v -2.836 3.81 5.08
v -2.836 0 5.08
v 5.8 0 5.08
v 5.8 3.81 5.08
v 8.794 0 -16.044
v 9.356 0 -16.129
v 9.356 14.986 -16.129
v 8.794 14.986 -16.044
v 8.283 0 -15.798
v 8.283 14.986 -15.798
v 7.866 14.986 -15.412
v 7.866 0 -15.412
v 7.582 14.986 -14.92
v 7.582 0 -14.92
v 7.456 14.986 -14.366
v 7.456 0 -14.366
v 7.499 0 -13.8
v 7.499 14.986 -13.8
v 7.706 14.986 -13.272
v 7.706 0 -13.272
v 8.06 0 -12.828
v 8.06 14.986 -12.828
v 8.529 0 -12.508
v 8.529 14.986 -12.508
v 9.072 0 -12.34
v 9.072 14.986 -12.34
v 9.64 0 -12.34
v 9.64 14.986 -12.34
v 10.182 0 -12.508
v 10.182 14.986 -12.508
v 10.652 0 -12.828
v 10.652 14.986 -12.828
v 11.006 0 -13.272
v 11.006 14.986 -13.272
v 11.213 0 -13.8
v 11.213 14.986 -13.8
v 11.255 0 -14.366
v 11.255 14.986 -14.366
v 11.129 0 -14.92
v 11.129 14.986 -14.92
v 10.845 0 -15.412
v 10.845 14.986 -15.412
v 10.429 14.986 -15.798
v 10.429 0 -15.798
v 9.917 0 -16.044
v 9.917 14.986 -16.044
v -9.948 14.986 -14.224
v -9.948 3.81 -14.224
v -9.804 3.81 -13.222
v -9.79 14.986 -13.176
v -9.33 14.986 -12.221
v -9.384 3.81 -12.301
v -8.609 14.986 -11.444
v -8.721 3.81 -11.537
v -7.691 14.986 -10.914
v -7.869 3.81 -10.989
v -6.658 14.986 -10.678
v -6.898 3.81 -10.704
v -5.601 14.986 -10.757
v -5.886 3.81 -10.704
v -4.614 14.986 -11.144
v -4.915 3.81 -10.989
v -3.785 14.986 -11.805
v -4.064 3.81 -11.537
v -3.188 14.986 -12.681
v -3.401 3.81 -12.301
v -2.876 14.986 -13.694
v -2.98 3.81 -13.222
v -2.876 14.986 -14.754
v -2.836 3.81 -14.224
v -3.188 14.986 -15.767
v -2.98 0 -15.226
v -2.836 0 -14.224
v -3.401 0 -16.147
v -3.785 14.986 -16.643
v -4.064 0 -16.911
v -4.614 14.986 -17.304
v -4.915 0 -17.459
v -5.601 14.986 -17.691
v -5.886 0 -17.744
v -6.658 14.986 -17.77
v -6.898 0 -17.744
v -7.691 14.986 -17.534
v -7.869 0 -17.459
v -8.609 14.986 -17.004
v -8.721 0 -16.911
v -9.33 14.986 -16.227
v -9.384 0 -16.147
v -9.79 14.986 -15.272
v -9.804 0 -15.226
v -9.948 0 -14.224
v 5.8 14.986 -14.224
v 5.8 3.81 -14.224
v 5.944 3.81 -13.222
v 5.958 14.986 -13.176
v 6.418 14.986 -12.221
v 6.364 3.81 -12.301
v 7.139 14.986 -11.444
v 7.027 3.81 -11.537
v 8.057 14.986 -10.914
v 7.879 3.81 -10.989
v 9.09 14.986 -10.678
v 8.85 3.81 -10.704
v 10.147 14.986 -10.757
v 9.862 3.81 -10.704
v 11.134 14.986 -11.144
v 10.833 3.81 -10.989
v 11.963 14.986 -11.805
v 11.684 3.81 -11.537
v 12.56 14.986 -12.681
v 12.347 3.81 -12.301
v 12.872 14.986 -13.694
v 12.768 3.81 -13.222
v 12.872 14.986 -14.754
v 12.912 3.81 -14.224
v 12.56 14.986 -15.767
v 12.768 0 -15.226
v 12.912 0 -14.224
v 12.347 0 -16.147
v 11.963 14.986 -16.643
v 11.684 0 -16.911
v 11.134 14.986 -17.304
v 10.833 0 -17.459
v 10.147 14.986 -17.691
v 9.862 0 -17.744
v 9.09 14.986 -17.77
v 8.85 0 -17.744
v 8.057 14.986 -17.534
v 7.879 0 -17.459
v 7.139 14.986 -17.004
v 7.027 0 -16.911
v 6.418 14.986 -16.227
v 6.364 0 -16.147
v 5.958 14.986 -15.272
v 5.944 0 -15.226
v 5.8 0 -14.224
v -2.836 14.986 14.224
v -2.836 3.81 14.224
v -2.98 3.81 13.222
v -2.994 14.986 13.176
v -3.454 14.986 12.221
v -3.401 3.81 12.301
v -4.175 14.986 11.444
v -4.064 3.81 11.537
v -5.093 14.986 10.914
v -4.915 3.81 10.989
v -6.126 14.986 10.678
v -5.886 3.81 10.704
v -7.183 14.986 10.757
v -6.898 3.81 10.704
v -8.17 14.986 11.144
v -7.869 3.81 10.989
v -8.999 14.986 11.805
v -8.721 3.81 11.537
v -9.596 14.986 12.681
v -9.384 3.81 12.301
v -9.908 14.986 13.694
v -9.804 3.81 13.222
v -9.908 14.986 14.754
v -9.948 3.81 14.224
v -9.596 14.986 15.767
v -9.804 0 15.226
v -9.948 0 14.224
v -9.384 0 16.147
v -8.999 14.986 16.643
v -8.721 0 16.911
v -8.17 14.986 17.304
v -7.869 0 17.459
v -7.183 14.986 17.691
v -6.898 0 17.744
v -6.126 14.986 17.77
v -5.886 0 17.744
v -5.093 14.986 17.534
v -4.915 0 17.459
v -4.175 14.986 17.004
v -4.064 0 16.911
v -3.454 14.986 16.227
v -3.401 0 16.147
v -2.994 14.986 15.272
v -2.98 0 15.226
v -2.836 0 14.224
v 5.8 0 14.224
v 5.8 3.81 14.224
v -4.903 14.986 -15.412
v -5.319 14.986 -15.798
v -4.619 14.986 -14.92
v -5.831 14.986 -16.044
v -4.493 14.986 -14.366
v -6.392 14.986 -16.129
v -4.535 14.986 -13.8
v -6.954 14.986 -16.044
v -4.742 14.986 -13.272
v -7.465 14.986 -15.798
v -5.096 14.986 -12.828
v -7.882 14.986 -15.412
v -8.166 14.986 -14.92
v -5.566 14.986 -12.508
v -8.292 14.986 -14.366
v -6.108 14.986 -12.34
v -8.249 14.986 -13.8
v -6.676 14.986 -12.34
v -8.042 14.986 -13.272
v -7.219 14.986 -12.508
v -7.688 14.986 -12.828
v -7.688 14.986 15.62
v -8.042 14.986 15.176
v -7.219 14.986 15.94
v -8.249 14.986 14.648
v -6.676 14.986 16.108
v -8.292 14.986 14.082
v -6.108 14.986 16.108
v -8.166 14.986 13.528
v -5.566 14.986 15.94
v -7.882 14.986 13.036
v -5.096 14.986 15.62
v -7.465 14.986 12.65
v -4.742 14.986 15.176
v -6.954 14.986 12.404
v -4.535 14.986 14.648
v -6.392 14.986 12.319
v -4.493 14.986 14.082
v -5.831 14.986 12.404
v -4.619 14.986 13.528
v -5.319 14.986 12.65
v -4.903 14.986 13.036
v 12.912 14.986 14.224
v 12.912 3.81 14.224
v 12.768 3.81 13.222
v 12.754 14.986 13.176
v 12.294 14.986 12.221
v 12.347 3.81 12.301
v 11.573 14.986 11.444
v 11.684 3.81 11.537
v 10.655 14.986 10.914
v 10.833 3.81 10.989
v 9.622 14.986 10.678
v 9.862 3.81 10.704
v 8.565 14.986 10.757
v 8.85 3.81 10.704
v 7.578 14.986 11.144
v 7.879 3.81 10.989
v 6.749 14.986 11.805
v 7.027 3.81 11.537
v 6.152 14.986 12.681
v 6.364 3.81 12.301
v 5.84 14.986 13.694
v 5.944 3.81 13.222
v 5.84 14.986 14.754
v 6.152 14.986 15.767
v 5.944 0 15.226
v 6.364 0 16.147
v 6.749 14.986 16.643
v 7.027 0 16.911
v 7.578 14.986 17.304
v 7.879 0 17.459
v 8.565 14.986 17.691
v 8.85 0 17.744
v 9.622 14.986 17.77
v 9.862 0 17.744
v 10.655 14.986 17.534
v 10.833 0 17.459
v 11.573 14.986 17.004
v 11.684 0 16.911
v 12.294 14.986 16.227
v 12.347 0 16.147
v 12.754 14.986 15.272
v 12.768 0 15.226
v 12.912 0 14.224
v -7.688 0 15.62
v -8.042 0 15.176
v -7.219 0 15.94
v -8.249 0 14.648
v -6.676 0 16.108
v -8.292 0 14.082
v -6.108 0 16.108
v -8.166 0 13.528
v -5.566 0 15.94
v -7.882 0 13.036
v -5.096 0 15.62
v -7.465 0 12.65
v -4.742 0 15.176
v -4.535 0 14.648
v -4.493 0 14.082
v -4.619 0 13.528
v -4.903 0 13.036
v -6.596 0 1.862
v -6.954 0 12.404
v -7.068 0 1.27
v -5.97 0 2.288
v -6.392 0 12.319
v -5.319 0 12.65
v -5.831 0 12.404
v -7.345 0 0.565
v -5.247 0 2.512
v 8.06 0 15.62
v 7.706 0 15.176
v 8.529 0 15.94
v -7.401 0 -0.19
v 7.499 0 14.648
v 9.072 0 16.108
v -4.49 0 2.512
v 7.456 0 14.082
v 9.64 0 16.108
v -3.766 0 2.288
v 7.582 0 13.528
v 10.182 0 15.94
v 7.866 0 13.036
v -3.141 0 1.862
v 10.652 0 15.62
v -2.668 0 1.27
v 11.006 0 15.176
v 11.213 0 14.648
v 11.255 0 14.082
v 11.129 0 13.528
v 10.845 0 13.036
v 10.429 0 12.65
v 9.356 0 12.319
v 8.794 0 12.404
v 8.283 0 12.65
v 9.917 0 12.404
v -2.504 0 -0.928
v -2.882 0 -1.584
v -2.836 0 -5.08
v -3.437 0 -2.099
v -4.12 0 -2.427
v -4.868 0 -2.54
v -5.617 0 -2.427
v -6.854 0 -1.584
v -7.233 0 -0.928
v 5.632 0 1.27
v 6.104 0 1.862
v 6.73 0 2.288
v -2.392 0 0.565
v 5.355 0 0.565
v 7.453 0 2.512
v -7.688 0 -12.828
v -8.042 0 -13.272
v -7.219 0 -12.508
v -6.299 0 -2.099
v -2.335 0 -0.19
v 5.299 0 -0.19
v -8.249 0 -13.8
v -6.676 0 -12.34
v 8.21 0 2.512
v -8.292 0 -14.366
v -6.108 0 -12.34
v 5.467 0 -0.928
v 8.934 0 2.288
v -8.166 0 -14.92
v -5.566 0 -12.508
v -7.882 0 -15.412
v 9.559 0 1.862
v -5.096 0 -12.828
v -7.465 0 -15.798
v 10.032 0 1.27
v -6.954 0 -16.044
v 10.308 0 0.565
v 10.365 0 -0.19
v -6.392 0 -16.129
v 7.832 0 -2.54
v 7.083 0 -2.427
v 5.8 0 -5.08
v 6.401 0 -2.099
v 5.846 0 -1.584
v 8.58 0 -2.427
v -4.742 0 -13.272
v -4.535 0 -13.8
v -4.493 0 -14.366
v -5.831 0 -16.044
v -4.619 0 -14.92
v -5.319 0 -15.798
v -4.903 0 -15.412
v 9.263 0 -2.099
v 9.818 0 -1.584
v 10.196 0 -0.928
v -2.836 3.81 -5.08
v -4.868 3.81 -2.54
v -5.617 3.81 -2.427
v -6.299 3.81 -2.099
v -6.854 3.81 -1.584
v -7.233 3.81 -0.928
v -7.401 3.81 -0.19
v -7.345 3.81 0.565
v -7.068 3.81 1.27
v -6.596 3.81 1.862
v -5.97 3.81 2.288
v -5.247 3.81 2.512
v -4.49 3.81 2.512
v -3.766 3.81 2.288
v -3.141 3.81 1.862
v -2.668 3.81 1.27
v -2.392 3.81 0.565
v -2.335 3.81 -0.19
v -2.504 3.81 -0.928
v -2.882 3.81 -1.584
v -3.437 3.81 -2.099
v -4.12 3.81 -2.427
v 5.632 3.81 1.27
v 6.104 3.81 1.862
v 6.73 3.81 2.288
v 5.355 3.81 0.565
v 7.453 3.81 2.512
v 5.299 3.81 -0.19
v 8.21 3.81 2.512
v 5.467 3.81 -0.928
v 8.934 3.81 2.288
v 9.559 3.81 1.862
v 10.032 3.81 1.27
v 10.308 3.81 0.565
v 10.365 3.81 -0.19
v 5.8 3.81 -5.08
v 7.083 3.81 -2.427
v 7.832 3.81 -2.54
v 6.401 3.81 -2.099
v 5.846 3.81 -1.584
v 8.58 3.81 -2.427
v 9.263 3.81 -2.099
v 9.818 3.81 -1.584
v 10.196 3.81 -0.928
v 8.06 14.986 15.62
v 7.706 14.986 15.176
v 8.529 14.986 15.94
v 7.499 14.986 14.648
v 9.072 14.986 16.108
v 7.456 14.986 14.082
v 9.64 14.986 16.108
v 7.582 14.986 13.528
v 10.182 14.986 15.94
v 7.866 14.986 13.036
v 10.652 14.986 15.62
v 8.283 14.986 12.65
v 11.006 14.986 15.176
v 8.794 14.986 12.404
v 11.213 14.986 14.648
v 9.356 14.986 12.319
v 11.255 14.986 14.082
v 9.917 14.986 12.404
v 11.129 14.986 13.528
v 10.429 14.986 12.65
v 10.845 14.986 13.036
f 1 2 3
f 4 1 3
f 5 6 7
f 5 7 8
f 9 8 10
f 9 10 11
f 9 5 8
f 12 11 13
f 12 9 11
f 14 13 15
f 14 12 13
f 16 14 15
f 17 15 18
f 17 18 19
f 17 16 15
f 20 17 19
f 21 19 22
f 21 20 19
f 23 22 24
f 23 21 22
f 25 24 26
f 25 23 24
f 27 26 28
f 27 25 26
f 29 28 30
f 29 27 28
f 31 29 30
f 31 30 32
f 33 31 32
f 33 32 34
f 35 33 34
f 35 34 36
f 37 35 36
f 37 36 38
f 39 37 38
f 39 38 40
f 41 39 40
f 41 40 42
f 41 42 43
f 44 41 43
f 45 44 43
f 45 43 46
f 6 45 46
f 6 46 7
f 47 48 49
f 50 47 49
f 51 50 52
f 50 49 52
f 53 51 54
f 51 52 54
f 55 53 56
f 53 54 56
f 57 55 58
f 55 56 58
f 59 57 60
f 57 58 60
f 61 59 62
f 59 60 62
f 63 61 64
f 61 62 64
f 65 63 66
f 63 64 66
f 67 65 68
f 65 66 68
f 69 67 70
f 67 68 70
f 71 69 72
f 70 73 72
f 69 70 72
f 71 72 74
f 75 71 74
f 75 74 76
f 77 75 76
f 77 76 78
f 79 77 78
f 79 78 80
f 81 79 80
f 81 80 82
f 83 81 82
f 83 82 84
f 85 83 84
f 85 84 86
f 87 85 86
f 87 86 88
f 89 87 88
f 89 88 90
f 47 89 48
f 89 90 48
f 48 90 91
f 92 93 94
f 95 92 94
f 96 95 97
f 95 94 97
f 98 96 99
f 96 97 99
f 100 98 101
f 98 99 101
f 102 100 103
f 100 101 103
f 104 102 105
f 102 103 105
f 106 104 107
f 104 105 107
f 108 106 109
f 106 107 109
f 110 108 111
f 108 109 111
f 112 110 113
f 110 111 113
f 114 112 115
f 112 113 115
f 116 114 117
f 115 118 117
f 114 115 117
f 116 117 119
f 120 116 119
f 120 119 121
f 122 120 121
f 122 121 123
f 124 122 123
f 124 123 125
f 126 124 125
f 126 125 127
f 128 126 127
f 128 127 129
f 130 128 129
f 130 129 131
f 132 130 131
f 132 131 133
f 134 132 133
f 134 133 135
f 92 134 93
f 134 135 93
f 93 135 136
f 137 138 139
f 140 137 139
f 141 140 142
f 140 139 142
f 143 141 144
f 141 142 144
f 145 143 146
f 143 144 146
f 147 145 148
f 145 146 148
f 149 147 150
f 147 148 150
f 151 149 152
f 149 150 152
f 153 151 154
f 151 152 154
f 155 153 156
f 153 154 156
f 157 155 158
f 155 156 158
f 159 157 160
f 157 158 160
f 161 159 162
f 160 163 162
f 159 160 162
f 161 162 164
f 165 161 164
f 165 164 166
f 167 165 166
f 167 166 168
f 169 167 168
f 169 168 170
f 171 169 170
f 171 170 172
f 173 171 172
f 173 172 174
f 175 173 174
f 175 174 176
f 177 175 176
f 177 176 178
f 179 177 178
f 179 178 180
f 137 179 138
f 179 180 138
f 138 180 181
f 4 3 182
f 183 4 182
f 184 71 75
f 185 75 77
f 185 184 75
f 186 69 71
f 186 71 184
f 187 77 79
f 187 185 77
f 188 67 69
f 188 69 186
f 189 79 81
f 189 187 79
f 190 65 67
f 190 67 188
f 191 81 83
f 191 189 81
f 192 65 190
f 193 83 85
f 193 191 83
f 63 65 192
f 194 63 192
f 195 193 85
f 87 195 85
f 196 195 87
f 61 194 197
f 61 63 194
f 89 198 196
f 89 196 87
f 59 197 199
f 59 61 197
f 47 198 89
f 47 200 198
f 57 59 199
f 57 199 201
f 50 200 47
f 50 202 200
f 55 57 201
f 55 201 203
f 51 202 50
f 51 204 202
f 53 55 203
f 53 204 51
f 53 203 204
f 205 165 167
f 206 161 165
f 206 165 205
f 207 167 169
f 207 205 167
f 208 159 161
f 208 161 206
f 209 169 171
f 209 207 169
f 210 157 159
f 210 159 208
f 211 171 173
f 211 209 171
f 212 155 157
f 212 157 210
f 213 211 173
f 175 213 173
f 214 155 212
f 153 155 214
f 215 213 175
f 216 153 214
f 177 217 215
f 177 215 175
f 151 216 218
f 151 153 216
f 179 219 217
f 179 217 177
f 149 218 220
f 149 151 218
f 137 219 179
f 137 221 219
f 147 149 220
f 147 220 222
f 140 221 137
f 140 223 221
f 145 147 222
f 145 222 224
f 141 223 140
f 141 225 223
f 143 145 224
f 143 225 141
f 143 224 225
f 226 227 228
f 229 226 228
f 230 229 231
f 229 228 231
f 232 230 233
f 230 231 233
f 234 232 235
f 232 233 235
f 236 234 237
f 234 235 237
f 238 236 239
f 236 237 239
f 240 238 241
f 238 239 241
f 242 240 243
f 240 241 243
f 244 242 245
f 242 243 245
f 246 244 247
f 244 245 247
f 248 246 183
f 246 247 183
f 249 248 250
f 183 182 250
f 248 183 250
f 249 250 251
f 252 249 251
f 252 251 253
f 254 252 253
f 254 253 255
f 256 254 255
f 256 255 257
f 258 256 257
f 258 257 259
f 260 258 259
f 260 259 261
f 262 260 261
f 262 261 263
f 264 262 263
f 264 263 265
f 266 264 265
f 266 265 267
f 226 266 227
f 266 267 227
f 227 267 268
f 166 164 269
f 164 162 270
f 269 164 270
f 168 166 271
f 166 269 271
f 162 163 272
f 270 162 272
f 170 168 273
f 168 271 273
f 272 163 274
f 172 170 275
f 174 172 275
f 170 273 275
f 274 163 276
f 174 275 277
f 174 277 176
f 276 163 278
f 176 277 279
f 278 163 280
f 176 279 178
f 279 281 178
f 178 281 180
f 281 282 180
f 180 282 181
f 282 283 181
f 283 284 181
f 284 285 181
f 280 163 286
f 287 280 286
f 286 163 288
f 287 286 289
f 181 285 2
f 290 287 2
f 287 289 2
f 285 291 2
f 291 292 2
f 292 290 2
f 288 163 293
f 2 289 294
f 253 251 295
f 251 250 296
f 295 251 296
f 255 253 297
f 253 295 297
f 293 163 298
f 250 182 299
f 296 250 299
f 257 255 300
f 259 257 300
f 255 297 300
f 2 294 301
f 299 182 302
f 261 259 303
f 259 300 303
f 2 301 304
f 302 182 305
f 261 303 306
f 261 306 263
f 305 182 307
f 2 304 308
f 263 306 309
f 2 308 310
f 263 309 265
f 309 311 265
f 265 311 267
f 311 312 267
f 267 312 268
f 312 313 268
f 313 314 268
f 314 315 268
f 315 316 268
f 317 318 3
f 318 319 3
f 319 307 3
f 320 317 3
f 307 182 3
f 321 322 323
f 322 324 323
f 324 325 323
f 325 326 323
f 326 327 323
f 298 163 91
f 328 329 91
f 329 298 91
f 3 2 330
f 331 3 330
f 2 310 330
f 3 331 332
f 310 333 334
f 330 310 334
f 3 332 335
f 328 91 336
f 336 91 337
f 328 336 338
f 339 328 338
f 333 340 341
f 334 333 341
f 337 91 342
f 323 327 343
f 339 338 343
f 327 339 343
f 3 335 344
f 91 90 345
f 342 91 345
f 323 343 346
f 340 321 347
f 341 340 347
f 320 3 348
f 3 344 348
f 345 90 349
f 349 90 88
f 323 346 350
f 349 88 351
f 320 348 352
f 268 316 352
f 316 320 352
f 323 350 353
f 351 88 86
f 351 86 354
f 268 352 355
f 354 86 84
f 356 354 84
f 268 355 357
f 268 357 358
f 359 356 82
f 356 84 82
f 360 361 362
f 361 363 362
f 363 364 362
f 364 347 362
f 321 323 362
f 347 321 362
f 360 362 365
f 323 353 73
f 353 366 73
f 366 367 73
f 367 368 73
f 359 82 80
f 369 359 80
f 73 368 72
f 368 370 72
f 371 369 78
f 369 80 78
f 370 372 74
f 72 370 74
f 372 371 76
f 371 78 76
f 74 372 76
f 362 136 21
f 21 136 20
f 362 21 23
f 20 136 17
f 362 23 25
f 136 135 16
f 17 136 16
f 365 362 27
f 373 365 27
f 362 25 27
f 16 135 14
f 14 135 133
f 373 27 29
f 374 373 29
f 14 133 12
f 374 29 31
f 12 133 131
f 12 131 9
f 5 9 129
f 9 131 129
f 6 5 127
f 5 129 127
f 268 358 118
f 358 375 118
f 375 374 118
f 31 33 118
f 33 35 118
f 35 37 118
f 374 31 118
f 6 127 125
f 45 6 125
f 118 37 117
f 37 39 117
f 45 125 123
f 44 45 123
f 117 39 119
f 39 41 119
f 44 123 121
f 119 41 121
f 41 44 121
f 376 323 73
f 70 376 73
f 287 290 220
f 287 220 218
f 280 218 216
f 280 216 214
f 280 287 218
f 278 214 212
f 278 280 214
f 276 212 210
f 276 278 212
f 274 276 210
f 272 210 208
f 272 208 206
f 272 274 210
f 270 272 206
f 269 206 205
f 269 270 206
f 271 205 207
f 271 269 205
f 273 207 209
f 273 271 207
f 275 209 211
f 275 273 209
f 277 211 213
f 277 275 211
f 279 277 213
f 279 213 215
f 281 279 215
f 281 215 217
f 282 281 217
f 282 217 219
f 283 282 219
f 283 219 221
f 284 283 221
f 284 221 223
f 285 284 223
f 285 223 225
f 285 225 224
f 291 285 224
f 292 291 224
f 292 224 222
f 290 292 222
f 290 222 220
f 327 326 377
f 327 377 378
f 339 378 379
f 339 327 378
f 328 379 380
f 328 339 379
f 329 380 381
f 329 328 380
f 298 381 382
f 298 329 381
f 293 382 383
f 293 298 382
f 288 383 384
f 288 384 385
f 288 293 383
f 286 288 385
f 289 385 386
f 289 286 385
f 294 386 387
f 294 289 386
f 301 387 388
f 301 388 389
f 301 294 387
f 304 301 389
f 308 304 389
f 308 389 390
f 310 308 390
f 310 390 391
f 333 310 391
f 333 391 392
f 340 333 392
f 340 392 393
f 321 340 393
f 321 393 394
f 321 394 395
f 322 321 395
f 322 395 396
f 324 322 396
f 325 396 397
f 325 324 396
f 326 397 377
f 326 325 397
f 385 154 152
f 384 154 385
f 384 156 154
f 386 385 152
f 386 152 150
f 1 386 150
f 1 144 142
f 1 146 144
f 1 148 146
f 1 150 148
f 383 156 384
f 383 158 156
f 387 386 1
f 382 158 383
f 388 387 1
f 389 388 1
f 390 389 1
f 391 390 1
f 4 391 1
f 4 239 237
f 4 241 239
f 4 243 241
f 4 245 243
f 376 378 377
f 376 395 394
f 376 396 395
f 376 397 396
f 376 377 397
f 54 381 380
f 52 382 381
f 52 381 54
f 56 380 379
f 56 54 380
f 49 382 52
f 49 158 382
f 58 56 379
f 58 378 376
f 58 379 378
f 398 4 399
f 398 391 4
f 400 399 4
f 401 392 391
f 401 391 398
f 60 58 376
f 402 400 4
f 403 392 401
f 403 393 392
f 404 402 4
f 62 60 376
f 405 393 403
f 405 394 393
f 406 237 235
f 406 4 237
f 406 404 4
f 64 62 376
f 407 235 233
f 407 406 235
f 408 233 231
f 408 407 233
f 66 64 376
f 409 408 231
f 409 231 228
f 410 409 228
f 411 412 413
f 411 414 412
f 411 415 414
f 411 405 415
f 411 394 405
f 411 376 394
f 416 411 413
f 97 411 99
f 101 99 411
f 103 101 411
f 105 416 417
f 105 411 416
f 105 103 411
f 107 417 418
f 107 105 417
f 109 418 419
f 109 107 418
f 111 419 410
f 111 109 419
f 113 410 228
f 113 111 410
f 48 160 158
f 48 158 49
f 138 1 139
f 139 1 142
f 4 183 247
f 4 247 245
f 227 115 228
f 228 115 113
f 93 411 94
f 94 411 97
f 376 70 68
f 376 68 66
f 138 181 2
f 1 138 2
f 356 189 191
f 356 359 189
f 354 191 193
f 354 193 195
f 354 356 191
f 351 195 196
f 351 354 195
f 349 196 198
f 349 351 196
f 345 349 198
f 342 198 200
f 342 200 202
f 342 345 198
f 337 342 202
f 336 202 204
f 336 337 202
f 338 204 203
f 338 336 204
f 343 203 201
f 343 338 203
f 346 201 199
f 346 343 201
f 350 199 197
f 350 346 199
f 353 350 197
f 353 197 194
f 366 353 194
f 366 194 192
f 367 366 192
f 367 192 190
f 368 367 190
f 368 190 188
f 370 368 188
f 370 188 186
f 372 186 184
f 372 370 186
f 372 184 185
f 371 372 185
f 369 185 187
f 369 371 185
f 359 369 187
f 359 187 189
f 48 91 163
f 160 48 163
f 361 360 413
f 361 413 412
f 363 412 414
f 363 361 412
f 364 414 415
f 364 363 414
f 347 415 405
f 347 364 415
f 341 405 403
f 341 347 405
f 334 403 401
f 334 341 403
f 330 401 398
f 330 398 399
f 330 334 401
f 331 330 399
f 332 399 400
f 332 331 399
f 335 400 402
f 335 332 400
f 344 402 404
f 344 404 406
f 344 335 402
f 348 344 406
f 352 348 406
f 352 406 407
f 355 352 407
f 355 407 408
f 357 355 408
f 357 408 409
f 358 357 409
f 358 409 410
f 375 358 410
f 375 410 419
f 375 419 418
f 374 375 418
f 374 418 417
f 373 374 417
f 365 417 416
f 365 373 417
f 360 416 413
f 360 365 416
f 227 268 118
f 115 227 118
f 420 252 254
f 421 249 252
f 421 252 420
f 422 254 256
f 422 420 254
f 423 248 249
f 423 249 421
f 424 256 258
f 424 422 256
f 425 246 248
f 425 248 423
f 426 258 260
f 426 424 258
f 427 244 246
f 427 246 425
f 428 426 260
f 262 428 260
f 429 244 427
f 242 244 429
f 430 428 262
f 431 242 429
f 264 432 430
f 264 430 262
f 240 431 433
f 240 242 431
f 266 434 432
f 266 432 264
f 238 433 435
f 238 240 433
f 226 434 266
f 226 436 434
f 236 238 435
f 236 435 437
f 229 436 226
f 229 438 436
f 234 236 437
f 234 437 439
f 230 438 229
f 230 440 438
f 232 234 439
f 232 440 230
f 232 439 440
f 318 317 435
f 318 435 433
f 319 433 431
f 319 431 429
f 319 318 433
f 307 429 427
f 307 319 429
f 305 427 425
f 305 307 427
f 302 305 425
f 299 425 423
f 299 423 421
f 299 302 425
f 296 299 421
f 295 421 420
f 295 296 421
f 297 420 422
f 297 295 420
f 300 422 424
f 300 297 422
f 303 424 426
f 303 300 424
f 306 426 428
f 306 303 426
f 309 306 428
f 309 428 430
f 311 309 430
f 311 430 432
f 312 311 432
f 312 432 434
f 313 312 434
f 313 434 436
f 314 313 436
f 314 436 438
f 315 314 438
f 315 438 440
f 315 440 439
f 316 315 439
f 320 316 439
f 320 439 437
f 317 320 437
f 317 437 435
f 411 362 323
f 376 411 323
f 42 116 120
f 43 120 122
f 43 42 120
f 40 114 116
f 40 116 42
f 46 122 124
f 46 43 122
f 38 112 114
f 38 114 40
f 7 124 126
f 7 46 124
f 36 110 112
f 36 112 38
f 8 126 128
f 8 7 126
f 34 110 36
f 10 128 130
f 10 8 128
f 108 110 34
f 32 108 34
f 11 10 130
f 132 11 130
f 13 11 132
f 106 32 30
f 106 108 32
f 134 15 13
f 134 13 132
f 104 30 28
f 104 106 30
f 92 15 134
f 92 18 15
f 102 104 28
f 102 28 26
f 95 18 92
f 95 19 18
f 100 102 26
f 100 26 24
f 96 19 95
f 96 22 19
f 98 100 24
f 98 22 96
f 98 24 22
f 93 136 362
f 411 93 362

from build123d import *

# Parameters (mm, degrees)
SKETCH1_R           = 2.54
SKETCH1_R_2         = 1.905
BOSS_EXTRUDE1_DEPTH = 3.81
SKETCH4_R           = 3.556
SKETCH4_R_2         = 1.905
BOSS_EXTRUDE4_DEPTH = 11.176


with BuildPart() as part:
    # Sketch1 → Boss-Extrude1 (new body)
    with BuildSketch(Plane(origin=(0, 0, 0), x_dir=(1, 0, 0), z_dir=(0, 1, 0))):
        with BuildLine():
            Line((-9.948186072, 14.224), (-9.948186072, -14.224))
            ThreePointArc((-9.948186072, -14.224), (-6.392186072, -17.78), (-2.836186072, -14.224))
            Line((-2.836186072, -14.224), (-2.836186072, -5.08))
            Line((-2.836186072, -5.08), (5.799813928, -5.08))
            Line((5.799813928, -5.08), (5.799813928, -14.224))
            ThreePointArc((5.799813928, -14.224), (9.355813928, -17.78), (12.911813928, -14.224))
            Line((12.911813928, -14.224), (12.911813928, 14.224))
            ThreePointArc((12.911813928, 14.224), (9.355813928, 17.78), (5.799813928, 14.224))
            Line((5.799813928, 14.224), (5.799813928, 5.08))
            Line((5.799813928, 5.08), (-2.836186072, 5.08))
            Line((-2.836186072, 5.08), (-2.836186072, 14.224))
            ThreePointArc((-2.836186072, 14.224), (-6.392186072, 17.78), (-9.948186072, 14.224))
        make_face()
        with Locations(Location((7.831813928, 0, 0), (0, 0, 90))):
            Circle(SKETCH1_R, mode=Mode.SUBTRACT)
        with Locations(Location((-4.868186072, 0, 0), (0, 0, 90))):
            Circle(SKETCH1_R, mode=Mode.SUBTRACT)
        with Locations(Location((-6.392186072, 14.224, 0), (0, 0, 90))):
            Circle(SKETCH1_R_2, mode=Mode.SUBTRACT)
        with Locations(Location((-6.392186072, -14.224, 0), (0, 0, 90))):
            Circle(SKETCH1_R_2, mode=Mode.SUBTRACT)
        with Locations(Location((9.355813928, 14.224, 0), (0, 0, 90))):
            Circle(SKETCH1_R_2, mode=Mode.SUBTRACT)
        with Locations(Location((9.355813928, -14.224, 0), (0, 0, 90))):
            Circle(SKETCH1_R_2, mode=Mode.SUBTRACT)
    extrude(amount=BOSS_EXTRUDE1_DEPTH)

    # Sketch4 → Boss-Extrude4 (add)
    # profile 1 of 4: a face of its own
    with BuildSketch(Plane(origin=(0, 3.81, 0), x_dir=(1, 0, 0), z_dir=(0, 1, 0))):
        with Locations(Location((-6.392186072, 14.224, 0), (0, 0, 180))):
            Circle(SKETCH4_R)
        with Locations(Location((-6.392186072, 14.224, 0), (0, 0, 90))):
            Circle(SKETCH4_R_2, mode=Mode.SUBTRACT)
    # profile 2 of 4: a face of its own
    with BuildSketch(Plane(origin=(0, 3.81, 0), x_dir=(1, 0, 0), z_dir=(0, 1, 0))):
        with Locations(Location((9.355813928, 14.224, 0), (0, 0, 180))):
            Circle(SKETCH4_R)
        with Locations(Location((9.355813928, 14.224, 0), (0, 0, 90))):
            Circle(SKETCH4_R_2, mode=Mode.SUBTRACT)
    # profile 3 of 4: a face of its own
    with BuildSketch(Plane(origin=(0, 3.81, 0), x_dir=(1, 0, 0), z_dir=(0, 1, 0))):
        with Locations((9.355813928, -14.224)):
            Circle(SKETCH4_R)
        with Locations(Location((9.355813928, -14.224, 0), (0, 0, 90))):
            Circle(SKETCH4_R_2, mode=Mode.SUBTRACT)
    # profile 4 of 4: a face of its own
    with BuildSketch(Plane(origin=(0, 3.81, 0), x_dir=(1, 0, 0), z_dir=(0, 1, 0))):
        with Locations((-6.392186072, -14.224)):
            Circle(SKETCH4_R)
        with Locations(Location((-6.392186072, -14.224, 0), (0, 0, 90))):
            Circle(SKETCH4_R_2, mode=Mode.SUBTRACT)
    extrude(amount=BOSS_EXTRUDE4_DEPTH)


solid = part.part
